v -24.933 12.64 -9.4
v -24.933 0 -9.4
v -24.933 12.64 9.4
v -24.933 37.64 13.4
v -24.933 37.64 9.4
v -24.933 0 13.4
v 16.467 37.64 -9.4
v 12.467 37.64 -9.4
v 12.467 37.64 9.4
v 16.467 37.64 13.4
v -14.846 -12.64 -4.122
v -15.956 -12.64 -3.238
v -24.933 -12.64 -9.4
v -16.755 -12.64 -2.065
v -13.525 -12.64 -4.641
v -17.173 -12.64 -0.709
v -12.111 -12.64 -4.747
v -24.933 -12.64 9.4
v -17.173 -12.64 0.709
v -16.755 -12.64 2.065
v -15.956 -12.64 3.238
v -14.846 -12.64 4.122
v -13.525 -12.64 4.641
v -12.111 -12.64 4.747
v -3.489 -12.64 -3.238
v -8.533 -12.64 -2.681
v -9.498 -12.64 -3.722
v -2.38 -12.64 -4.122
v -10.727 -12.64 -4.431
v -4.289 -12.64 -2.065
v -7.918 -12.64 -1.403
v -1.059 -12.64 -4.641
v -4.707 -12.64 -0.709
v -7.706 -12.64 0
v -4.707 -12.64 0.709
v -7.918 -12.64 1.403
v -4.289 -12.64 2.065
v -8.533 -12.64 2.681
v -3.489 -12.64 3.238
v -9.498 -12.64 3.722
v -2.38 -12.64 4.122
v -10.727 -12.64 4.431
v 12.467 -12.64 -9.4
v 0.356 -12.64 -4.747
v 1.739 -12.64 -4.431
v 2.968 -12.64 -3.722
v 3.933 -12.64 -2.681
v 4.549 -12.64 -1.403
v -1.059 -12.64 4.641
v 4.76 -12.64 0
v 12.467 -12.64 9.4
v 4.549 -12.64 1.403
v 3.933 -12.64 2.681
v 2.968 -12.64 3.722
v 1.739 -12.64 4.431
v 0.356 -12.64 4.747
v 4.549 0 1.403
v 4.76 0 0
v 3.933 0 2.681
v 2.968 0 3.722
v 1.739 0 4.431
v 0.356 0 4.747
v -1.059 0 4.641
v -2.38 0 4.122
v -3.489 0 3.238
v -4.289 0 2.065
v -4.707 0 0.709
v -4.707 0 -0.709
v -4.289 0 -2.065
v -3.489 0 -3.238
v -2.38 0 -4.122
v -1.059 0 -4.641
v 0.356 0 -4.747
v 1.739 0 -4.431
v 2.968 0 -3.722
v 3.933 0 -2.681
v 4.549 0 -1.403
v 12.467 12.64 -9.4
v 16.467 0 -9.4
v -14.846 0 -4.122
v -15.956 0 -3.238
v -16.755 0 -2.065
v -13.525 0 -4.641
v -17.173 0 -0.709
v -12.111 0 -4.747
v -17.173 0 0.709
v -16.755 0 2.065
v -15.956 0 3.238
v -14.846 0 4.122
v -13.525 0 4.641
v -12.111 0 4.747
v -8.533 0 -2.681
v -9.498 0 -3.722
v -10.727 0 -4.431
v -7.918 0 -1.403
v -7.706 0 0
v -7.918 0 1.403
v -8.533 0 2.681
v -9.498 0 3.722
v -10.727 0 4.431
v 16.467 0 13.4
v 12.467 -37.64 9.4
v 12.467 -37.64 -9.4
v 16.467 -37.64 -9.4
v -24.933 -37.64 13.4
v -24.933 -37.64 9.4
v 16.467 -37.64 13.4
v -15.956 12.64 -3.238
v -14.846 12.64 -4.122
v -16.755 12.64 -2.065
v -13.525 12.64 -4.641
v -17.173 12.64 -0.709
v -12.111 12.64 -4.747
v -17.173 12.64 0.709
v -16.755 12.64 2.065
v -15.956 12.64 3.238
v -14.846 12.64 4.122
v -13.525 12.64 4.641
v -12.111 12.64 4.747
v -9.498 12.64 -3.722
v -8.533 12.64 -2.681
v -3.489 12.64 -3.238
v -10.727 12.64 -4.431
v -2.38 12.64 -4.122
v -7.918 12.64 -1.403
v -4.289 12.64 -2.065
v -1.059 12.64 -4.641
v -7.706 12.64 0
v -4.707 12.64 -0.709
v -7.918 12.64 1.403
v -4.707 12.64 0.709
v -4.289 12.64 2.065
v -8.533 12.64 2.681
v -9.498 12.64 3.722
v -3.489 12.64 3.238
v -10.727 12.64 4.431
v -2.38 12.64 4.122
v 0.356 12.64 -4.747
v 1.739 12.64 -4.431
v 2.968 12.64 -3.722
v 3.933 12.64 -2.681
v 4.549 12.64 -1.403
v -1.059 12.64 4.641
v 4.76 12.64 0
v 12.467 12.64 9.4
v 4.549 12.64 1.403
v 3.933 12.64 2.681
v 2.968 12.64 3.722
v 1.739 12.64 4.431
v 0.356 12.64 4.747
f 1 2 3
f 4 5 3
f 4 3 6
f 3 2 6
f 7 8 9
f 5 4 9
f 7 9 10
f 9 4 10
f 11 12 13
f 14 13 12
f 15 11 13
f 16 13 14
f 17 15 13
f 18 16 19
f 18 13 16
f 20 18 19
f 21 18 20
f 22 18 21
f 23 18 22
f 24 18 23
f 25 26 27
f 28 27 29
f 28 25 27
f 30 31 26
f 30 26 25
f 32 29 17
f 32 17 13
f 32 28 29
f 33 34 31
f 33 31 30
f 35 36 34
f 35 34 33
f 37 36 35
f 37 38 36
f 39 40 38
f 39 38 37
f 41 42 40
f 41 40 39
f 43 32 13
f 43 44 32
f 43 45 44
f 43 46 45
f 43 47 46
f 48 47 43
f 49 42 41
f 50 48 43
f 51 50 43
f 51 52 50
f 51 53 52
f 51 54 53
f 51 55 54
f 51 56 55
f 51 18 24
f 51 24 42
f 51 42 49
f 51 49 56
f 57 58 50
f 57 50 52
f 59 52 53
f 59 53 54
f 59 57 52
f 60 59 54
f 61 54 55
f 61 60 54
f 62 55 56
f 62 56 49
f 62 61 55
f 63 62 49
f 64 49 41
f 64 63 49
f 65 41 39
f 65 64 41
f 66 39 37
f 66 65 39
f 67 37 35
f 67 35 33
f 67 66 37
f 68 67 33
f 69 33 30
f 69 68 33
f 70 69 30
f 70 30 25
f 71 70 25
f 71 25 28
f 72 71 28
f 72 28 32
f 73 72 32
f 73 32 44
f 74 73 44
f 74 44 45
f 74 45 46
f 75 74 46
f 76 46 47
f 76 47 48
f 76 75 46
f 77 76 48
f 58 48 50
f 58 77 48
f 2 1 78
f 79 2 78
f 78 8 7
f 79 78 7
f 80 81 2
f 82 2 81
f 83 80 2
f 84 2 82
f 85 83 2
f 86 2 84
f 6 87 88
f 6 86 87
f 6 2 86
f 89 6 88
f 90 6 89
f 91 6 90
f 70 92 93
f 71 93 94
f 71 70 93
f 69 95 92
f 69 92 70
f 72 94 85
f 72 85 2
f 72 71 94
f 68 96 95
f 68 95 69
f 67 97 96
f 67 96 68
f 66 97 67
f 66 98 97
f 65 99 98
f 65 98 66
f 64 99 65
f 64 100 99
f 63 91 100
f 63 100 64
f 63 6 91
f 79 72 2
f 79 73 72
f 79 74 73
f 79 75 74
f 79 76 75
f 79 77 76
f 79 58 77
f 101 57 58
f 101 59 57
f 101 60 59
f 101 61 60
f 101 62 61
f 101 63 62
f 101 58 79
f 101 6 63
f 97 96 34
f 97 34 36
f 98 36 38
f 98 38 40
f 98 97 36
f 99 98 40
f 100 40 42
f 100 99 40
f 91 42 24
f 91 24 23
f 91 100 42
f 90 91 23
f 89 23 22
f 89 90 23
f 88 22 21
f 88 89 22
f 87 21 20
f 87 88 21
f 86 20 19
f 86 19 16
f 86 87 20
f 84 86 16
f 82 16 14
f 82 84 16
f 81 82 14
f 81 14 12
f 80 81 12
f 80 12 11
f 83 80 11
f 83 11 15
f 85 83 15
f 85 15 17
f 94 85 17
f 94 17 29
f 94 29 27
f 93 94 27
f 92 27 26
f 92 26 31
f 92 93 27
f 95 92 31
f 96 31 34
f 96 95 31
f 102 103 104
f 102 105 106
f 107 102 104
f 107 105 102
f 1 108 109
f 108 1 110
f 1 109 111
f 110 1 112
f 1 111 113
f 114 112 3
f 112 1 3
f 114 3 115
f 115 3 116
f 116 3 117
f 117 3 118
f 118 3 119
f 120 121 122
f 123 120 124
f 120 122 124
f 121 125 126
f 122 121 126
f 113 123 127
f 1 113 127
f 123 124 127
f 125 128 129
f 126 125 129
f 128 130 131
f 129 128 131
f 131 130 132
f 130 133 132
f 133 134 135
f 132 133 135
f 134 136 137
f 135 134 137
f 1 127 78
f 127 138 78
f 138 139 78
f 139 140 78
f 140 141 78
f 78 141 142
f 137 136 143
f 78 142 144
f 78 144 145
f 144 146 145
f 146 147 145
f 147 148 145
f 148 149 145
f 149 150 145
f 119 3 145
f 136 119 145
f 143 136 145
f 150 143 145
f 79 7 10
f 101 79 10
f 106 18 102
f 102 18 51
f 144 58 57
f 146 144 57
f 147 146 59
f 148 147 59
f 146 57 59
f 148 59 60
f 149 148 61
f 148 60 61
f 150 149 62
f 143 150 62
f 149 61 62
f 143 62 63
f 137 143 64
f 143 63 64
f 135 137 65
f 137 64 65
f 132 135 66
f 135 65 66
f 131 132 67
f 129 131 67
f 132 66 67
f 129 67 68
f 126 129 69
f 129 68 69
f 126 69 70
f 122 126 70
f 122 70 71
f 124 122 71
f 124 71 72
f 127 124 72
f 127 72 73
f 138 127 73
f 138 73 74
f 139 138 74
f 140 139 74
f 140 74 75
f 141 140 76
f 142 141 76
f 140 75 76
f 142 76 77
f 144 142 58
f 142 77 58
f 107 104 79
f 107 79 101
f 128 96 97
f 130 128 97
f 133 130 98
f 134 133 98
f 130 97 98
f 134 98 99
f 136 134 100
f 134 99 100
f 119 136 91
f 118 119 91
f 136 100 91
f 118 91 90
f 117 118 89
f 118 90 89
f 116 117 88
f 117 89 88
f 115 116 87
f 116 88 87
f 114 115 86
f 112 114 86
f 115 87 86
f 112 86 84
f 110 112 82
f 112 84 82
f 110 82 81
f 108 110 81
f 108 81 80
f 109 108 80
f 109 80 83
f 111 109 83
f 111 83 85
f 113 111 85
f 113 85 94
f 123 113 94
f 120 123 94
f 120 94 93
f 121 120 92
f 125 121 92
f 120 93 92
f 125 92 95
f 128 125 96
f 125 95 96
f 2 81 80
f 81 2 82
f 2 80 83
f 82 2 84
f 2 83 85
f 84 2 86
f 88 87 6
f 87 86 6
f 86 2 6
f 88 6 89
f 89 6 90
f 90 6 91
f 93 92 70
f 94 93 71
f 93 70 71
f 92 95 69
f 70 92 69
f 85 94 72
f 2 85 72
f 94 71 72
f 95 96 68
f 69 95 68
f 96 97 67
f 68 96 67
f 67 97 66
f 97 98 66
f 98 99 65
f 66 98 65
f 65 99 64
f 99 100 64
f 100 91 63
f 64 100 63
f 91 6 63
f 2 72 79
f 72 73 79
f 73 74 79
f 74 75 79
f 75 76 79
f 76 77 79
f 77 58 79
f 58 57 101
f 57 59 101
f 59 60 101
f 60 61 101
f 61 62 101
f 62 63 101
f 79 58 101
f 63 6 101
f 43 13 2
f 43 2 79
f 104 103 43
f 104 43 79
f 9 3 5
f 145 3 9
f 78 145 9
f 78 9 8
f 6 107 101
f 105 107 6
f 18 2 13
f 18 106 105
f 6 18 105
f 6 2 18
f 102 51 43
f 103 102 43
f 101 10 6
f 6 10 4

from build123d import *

# Parameters (mm, degrees)
F0_W          = 37.4
F0_H          = 18.8
F0_R          = 4.76
F1_DEPTH      = 12.64
F3_DEPTH      = 25
F3_DEPTH_BACK = 12.64


with BuildPart() as f1:
    # F0 (on Front) → F1 (new body)
    with BuildSketch(Plane.XZ):
        with Locations((-6.2333, 0)):
            Rectangle(F0_W, F0_H)
        with Locations((-12.4663, 0)):
            Circle(F0_R, mode=Mode.SUBTRACT)
        Circle(F0_R, mode=Mode.SUBTRACT)
    extrude(amount=F1_DEPTH)

    # F2 (on face) → F3 (join, two sides)
    with BuildSketch(Plane.XZ.offset(12.64)) as f3_sk:
        Polygon((12.4667, 9.4), (12.4667, -9.4), (16.4667, -9.4), (16.4667, 13.4), (-24.9333, 13.4), (-24.9333, 9.4), align=None)
    extrude(amount=F3_DEPTH)
    extrude(f3_sk.sketch, amount=-F3_DEPTH_BACK)


with BuildPart() as f4_1:
    # F4: instance of F1
    add(f1.part.mirror(Plane.XZ))


solid = Compound([f1.part, f4_1.part])
